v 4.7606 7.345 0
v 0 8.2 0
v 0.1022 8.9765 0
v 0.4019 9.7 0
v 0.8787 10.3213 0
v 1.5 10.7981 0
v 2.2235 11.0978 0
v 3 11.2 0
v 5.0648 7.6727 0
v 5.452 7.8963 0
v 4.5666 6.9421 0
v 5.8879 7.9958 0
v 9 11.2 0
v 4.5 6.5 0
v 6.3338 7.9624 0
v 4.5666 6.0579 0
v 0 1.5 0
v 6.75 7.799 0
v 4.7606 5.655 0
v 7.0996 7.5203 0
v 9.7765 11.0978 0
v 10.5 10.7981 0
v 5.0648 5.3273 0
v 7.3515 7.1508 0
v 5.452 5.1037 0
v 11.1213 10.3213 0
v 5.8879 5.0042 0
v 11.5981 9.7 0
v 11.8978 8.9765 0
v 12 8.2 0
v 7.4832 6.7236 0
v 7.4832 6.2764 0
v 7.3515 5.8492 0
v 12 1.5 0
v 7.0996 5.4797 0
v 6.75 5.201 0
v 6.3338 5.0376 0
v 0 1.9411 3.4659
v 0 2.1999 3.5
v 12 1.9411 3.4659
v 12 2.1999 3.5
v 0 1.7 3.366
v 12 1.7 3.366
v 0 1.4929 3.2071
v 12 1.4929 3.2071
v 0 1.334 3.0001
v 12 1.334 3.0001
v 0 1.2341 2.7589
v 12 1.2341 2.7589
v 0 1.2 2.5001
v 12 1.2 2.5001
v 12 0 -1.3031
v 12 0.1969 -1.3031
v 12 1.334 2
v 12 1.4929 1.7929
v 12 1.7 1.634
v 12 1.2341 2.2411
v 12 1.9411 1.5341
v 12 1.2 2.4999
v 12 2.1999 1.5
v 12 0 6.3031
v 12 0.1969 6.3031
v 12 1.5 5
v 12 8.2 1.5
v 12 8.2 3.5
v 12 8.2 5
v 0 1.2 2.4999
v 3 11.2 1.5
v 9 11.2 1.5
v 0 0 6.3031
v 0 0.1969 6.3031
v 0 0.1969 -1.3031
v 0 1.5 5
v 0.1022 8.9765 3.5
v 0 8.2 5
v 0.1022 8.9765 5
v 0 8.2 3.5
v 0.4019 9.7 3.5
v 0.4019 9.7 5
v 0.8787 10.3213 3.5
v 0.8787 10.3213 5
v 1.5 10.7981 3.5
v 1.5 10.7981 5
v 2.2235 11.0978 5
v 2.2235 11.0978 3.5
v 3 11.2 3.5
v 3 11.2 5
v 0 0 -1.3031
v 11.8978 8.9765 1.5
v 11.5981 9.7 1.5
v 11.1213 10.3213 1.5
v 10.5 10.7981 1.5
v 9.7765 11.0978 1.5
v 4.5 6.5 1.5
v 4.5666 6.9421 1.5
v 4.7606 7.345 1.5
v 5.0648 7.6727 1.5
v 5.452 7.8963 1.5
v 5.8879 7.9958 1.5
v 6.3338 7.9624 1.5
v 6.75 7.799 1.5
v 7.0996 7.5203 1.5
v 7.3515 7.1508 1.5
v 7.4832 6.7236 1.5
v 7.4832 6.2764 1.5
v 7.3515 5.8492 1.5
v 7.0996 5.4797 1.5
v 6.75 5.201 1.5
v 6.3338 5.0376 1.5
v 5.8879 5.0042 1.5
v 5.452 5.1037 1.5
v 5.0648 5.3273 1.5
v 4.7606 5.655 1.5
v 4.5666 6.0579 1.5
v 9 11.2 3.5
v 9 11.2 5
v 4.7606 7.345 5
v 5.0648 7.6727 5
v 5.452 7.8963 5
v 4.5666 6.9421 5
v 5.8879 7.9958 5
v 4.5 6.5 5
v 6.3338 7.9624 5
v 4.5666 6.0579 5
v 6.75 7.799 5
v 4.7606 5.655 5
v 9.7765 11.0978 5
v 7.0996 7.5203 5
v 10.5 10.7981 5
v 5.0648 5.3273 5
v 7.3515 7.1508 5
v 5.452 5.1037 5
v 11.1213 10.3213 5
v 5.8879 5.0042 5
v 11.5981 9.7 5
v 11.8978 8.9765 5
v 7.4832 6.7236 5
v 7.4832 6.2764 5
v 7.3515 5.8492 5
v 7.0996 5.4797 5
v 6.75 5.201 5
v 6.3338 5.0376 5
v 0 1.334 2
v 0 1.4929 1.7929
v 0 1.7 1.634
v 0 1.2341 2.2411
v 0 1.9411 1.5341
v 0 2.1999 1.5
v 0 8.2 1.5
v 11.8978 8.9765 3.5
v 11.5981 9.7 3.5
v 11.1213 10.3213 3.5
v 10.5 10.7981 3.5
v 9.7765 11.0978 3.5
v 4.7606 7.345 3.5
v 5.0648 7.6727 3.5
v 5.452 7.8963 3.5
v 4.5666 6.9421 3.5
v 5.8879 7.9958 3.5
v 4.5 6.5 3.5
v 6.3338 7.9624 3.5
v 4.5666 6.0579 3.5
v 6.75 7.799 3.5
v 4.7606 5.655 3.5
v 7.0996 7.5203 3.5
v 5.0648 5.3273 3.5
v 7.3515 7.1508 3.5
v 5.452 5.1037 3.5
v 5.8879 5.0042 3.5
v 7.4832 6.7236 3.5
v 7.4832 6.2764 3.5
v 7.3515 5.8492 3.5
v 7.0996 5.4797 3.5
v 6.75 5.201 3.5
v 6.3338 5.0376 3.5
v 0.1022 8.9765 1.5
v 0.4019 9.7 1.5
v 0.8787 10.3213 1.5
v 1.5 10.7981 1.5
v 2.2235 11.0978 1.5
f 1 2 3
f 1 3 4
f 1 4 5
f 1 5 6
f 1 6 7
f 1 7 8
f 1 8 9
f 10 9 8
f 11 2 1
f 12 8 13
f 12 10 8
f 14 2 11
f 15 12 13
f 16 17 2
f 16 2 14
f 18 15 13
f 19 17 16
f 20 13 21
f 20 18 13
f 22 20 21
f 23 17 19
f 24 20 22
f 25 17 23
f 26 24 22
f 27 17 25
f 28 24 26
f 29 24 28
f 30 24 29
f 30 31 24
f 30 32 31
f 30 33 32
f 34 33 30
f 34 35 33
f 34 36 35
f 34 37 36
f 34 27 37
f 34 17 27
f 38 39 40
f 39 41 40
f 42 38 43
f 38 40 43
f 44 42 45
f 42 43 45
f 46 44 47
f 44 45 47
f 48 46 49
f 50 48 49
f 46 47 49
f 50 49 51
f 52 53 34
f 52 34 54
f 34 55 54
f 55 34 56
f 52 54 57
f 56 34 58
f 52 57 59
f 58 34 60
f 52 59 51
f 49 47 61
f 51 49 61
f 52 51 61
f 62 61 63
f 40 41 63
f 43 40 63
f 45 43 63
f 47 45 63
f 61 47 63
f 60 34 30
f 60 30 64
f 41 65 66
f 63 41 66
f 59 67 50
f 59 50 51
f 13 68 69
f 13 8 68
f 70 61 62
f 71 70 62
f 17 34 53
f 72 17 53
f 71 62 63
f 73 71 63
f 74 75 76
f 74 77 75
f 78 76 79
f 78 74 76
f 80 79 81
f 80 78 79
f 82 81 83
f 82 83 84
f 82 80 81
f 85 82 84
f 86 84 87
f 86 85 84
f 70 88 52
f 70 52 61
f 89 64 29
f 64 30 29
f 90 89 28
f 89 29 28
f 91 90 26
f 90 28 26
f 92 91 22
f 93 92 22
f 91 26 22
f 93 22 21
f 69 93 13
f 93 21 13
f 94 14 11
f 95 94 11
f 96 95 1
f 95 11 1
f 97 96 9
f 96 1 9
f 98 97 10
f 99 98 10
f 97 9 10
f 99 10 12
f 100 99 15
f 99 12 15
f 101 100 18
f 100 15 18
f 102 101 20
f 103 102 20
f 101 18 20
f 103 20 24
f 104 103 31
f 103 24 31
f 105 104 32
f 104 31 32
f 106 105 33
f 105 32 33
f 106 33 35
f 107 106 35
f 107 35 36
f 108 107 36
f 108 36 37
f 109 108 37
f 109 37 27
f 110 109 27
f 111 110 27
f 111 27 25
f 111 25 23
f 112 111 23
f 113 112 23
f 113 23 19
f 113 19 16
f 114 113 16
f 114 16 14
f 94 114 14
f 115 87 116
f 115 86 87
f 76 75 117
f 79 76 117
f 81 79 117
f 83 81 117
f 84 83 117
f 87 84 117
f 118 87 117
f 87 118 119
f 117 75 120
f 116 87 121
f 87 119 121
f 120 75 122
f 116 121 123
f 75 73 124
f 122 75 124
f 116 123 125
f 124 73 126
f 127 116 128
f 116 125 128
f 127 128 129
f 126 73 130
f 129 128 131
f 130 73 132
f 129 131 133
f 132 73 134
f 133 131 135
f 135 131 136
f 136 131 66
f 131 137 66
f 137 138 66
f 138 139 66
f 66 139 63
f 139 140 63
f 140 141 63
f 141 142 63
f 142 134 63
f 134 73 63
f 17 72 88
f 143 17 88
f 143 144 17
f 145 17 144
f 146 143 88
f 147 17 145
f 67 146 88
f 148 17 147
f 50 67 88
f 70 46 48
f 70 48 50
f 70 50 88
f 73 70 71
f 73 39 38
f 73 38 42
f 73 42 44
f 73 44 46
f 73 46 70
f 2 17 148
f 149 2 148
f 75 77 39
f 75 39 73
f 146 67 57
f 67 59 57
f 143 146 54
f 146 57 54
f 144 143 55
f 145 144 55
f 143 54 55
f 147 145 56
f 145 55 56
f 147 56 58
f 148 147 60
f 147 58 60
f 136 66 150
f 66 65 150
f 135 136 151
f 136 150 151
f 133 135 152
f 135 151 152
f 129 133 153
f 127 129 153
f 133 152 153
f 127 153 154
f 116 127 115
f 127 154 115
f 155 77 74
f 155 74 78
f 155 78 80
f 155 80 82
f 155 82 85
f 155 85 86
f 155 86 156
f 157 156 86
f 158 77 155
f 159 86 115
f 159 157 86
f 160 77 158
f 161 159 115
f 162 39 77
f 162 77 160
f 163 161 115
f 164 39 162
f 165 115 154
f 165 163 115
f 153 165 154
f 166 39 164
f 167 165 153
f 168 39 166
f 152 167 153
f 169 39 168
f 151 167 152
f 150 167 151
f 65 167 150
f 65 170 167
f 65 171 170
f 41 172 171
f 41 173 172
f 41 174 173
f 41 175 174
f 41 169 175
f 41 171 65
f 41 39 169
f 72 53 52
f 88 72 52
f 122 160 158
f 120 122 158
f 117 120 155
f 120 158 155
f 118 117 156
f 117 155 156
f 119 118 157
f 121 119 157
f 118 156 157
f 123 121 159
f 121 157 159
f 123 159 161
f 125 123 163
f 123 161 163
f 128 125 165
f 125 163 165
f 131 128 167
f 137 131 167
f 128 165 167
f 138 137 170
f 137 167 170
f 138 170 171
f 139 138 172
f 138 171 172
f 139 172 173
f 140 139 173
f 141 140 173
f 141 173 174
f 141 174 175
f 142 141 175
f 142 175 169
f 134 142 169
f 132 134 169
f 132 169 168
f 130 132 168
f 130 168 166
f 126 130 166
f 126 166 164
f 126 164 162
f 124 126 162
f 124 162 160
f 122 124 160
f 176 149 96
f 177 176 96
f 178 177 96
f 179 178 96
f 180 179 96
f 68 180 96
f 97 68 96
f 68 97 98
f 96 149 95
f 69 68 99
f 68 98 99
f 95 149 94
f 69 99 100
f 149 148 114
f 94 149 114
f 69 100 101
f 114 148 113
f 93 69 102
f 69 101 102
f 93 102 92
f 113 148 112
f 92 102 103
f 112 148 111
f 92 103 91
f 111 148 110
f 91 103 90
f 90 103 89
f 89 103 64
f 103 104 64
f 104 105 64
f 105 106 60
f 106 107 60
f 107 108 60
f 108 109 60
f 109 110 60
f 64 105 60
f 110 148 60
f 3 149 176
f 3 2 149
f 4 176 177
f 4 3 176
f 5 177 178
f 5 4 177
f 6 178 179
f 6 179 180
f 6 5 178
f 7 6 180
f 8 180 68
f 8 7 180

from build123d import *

# Parameters (mm, degrees)
SKETCH1_W           = 12
SKETCH1_H           = 5
BOSS_EXTRUDE1_DEPTH = 1.2
SKETCH2_W           = 12
SKETCH2_H           = 1.5
BOSS_EXTRUDE2_DEPTH = 10
FILLET1_R           = 3
FILLET2_R           = 1
SKETCH3_R           = 1.5
CUT_EXTRUDE1_DEPTH  = 18.159254063
BOSS_EXTRUDE3_DEPTH = 12


with BuildPart() as part:
    # Sketch1 → Boss-Extrude1 (new body)
    with BuildSketch(Plane(origin=(0, 0, 0), x_dir=(1, 0, 0), z_dir=(0, 1, 0))):
        with Locations((6, -2.5)):
            Rectangle(SKETCH1_W, SKETCH1_H)
    extrude(amount=BOSS_EXTRUDE1_DEPTH)

    # Sketch2 → Boss-Extrude2 (add)
    with BuildSketch(Plane(origin=(0, 1.2, 0), x_dir=(1, 0, 0), z_dir=(0, 1, 0))):
        with Locations((6, -4.25)):
            Rectangle(SKETCH2_W, SKETCH2_H)
        with Locations((6, -0.75)):
            Rectangle(SKETCH2_W, SKETCH2_H)
    extrude(amount=BOSS_EXTRUDE2_DEPTH)

    # Fillet1
    fillet1_edges = [part.edges().sort_by_distance(p)[0] for p in [
        (0, 11.2, 4.25),
        (12, 11.2, 4.25),
        (12, 11.2, 0.75),
        (0, 11.2, 0.75),
    ]]
    fillet(fillet1_edges, radius=FILLET1_R)

    # Fillet2
    fillet2_edges = [part.edges().sort_by_distance(p)[0] for p in [
        (6, 1.2, 3.5),
        (6, 1.2, 1.5),
    ]]
    fillet(fillet2_edges, radius=FILLET2_R - 0.0001)  # a hair under: the kernel refuses the full size

    # Sketch3 → Cut-Extrude1 (cut, through all)
    with BuildSketch(Plane(origin=(0, 0, 0), x_dir=(-1, 0, 0), z_dir=(0, 0, -1))):
        with Locations((-6, 6.5)):
            Circle(SKETCH3_R)
    extrude(amount=-CUT_EXTRUDE1_DEPTH, mode=Mode.SUBTRACT)

    # Sketch4 → Boss-Extrude3 (add)
    with BuildSketch(Plane(origin=(12, 0, 0), x_dir=(0, 0, -1), z_dir=(1, 0, 0))):
        Polygon((0, 1.5), (1.303058947, 0.196941053), (1.303058947, 0), (0, 0), align=None)
        Polygon((-6.303058947, 0), (-6.303058947, 0.196941053), (-5, 1.5), (-5, 0), align=None)
    extrude(amount=-BOSS_EXTRUDE3_DEPTH)


solid = part.part
